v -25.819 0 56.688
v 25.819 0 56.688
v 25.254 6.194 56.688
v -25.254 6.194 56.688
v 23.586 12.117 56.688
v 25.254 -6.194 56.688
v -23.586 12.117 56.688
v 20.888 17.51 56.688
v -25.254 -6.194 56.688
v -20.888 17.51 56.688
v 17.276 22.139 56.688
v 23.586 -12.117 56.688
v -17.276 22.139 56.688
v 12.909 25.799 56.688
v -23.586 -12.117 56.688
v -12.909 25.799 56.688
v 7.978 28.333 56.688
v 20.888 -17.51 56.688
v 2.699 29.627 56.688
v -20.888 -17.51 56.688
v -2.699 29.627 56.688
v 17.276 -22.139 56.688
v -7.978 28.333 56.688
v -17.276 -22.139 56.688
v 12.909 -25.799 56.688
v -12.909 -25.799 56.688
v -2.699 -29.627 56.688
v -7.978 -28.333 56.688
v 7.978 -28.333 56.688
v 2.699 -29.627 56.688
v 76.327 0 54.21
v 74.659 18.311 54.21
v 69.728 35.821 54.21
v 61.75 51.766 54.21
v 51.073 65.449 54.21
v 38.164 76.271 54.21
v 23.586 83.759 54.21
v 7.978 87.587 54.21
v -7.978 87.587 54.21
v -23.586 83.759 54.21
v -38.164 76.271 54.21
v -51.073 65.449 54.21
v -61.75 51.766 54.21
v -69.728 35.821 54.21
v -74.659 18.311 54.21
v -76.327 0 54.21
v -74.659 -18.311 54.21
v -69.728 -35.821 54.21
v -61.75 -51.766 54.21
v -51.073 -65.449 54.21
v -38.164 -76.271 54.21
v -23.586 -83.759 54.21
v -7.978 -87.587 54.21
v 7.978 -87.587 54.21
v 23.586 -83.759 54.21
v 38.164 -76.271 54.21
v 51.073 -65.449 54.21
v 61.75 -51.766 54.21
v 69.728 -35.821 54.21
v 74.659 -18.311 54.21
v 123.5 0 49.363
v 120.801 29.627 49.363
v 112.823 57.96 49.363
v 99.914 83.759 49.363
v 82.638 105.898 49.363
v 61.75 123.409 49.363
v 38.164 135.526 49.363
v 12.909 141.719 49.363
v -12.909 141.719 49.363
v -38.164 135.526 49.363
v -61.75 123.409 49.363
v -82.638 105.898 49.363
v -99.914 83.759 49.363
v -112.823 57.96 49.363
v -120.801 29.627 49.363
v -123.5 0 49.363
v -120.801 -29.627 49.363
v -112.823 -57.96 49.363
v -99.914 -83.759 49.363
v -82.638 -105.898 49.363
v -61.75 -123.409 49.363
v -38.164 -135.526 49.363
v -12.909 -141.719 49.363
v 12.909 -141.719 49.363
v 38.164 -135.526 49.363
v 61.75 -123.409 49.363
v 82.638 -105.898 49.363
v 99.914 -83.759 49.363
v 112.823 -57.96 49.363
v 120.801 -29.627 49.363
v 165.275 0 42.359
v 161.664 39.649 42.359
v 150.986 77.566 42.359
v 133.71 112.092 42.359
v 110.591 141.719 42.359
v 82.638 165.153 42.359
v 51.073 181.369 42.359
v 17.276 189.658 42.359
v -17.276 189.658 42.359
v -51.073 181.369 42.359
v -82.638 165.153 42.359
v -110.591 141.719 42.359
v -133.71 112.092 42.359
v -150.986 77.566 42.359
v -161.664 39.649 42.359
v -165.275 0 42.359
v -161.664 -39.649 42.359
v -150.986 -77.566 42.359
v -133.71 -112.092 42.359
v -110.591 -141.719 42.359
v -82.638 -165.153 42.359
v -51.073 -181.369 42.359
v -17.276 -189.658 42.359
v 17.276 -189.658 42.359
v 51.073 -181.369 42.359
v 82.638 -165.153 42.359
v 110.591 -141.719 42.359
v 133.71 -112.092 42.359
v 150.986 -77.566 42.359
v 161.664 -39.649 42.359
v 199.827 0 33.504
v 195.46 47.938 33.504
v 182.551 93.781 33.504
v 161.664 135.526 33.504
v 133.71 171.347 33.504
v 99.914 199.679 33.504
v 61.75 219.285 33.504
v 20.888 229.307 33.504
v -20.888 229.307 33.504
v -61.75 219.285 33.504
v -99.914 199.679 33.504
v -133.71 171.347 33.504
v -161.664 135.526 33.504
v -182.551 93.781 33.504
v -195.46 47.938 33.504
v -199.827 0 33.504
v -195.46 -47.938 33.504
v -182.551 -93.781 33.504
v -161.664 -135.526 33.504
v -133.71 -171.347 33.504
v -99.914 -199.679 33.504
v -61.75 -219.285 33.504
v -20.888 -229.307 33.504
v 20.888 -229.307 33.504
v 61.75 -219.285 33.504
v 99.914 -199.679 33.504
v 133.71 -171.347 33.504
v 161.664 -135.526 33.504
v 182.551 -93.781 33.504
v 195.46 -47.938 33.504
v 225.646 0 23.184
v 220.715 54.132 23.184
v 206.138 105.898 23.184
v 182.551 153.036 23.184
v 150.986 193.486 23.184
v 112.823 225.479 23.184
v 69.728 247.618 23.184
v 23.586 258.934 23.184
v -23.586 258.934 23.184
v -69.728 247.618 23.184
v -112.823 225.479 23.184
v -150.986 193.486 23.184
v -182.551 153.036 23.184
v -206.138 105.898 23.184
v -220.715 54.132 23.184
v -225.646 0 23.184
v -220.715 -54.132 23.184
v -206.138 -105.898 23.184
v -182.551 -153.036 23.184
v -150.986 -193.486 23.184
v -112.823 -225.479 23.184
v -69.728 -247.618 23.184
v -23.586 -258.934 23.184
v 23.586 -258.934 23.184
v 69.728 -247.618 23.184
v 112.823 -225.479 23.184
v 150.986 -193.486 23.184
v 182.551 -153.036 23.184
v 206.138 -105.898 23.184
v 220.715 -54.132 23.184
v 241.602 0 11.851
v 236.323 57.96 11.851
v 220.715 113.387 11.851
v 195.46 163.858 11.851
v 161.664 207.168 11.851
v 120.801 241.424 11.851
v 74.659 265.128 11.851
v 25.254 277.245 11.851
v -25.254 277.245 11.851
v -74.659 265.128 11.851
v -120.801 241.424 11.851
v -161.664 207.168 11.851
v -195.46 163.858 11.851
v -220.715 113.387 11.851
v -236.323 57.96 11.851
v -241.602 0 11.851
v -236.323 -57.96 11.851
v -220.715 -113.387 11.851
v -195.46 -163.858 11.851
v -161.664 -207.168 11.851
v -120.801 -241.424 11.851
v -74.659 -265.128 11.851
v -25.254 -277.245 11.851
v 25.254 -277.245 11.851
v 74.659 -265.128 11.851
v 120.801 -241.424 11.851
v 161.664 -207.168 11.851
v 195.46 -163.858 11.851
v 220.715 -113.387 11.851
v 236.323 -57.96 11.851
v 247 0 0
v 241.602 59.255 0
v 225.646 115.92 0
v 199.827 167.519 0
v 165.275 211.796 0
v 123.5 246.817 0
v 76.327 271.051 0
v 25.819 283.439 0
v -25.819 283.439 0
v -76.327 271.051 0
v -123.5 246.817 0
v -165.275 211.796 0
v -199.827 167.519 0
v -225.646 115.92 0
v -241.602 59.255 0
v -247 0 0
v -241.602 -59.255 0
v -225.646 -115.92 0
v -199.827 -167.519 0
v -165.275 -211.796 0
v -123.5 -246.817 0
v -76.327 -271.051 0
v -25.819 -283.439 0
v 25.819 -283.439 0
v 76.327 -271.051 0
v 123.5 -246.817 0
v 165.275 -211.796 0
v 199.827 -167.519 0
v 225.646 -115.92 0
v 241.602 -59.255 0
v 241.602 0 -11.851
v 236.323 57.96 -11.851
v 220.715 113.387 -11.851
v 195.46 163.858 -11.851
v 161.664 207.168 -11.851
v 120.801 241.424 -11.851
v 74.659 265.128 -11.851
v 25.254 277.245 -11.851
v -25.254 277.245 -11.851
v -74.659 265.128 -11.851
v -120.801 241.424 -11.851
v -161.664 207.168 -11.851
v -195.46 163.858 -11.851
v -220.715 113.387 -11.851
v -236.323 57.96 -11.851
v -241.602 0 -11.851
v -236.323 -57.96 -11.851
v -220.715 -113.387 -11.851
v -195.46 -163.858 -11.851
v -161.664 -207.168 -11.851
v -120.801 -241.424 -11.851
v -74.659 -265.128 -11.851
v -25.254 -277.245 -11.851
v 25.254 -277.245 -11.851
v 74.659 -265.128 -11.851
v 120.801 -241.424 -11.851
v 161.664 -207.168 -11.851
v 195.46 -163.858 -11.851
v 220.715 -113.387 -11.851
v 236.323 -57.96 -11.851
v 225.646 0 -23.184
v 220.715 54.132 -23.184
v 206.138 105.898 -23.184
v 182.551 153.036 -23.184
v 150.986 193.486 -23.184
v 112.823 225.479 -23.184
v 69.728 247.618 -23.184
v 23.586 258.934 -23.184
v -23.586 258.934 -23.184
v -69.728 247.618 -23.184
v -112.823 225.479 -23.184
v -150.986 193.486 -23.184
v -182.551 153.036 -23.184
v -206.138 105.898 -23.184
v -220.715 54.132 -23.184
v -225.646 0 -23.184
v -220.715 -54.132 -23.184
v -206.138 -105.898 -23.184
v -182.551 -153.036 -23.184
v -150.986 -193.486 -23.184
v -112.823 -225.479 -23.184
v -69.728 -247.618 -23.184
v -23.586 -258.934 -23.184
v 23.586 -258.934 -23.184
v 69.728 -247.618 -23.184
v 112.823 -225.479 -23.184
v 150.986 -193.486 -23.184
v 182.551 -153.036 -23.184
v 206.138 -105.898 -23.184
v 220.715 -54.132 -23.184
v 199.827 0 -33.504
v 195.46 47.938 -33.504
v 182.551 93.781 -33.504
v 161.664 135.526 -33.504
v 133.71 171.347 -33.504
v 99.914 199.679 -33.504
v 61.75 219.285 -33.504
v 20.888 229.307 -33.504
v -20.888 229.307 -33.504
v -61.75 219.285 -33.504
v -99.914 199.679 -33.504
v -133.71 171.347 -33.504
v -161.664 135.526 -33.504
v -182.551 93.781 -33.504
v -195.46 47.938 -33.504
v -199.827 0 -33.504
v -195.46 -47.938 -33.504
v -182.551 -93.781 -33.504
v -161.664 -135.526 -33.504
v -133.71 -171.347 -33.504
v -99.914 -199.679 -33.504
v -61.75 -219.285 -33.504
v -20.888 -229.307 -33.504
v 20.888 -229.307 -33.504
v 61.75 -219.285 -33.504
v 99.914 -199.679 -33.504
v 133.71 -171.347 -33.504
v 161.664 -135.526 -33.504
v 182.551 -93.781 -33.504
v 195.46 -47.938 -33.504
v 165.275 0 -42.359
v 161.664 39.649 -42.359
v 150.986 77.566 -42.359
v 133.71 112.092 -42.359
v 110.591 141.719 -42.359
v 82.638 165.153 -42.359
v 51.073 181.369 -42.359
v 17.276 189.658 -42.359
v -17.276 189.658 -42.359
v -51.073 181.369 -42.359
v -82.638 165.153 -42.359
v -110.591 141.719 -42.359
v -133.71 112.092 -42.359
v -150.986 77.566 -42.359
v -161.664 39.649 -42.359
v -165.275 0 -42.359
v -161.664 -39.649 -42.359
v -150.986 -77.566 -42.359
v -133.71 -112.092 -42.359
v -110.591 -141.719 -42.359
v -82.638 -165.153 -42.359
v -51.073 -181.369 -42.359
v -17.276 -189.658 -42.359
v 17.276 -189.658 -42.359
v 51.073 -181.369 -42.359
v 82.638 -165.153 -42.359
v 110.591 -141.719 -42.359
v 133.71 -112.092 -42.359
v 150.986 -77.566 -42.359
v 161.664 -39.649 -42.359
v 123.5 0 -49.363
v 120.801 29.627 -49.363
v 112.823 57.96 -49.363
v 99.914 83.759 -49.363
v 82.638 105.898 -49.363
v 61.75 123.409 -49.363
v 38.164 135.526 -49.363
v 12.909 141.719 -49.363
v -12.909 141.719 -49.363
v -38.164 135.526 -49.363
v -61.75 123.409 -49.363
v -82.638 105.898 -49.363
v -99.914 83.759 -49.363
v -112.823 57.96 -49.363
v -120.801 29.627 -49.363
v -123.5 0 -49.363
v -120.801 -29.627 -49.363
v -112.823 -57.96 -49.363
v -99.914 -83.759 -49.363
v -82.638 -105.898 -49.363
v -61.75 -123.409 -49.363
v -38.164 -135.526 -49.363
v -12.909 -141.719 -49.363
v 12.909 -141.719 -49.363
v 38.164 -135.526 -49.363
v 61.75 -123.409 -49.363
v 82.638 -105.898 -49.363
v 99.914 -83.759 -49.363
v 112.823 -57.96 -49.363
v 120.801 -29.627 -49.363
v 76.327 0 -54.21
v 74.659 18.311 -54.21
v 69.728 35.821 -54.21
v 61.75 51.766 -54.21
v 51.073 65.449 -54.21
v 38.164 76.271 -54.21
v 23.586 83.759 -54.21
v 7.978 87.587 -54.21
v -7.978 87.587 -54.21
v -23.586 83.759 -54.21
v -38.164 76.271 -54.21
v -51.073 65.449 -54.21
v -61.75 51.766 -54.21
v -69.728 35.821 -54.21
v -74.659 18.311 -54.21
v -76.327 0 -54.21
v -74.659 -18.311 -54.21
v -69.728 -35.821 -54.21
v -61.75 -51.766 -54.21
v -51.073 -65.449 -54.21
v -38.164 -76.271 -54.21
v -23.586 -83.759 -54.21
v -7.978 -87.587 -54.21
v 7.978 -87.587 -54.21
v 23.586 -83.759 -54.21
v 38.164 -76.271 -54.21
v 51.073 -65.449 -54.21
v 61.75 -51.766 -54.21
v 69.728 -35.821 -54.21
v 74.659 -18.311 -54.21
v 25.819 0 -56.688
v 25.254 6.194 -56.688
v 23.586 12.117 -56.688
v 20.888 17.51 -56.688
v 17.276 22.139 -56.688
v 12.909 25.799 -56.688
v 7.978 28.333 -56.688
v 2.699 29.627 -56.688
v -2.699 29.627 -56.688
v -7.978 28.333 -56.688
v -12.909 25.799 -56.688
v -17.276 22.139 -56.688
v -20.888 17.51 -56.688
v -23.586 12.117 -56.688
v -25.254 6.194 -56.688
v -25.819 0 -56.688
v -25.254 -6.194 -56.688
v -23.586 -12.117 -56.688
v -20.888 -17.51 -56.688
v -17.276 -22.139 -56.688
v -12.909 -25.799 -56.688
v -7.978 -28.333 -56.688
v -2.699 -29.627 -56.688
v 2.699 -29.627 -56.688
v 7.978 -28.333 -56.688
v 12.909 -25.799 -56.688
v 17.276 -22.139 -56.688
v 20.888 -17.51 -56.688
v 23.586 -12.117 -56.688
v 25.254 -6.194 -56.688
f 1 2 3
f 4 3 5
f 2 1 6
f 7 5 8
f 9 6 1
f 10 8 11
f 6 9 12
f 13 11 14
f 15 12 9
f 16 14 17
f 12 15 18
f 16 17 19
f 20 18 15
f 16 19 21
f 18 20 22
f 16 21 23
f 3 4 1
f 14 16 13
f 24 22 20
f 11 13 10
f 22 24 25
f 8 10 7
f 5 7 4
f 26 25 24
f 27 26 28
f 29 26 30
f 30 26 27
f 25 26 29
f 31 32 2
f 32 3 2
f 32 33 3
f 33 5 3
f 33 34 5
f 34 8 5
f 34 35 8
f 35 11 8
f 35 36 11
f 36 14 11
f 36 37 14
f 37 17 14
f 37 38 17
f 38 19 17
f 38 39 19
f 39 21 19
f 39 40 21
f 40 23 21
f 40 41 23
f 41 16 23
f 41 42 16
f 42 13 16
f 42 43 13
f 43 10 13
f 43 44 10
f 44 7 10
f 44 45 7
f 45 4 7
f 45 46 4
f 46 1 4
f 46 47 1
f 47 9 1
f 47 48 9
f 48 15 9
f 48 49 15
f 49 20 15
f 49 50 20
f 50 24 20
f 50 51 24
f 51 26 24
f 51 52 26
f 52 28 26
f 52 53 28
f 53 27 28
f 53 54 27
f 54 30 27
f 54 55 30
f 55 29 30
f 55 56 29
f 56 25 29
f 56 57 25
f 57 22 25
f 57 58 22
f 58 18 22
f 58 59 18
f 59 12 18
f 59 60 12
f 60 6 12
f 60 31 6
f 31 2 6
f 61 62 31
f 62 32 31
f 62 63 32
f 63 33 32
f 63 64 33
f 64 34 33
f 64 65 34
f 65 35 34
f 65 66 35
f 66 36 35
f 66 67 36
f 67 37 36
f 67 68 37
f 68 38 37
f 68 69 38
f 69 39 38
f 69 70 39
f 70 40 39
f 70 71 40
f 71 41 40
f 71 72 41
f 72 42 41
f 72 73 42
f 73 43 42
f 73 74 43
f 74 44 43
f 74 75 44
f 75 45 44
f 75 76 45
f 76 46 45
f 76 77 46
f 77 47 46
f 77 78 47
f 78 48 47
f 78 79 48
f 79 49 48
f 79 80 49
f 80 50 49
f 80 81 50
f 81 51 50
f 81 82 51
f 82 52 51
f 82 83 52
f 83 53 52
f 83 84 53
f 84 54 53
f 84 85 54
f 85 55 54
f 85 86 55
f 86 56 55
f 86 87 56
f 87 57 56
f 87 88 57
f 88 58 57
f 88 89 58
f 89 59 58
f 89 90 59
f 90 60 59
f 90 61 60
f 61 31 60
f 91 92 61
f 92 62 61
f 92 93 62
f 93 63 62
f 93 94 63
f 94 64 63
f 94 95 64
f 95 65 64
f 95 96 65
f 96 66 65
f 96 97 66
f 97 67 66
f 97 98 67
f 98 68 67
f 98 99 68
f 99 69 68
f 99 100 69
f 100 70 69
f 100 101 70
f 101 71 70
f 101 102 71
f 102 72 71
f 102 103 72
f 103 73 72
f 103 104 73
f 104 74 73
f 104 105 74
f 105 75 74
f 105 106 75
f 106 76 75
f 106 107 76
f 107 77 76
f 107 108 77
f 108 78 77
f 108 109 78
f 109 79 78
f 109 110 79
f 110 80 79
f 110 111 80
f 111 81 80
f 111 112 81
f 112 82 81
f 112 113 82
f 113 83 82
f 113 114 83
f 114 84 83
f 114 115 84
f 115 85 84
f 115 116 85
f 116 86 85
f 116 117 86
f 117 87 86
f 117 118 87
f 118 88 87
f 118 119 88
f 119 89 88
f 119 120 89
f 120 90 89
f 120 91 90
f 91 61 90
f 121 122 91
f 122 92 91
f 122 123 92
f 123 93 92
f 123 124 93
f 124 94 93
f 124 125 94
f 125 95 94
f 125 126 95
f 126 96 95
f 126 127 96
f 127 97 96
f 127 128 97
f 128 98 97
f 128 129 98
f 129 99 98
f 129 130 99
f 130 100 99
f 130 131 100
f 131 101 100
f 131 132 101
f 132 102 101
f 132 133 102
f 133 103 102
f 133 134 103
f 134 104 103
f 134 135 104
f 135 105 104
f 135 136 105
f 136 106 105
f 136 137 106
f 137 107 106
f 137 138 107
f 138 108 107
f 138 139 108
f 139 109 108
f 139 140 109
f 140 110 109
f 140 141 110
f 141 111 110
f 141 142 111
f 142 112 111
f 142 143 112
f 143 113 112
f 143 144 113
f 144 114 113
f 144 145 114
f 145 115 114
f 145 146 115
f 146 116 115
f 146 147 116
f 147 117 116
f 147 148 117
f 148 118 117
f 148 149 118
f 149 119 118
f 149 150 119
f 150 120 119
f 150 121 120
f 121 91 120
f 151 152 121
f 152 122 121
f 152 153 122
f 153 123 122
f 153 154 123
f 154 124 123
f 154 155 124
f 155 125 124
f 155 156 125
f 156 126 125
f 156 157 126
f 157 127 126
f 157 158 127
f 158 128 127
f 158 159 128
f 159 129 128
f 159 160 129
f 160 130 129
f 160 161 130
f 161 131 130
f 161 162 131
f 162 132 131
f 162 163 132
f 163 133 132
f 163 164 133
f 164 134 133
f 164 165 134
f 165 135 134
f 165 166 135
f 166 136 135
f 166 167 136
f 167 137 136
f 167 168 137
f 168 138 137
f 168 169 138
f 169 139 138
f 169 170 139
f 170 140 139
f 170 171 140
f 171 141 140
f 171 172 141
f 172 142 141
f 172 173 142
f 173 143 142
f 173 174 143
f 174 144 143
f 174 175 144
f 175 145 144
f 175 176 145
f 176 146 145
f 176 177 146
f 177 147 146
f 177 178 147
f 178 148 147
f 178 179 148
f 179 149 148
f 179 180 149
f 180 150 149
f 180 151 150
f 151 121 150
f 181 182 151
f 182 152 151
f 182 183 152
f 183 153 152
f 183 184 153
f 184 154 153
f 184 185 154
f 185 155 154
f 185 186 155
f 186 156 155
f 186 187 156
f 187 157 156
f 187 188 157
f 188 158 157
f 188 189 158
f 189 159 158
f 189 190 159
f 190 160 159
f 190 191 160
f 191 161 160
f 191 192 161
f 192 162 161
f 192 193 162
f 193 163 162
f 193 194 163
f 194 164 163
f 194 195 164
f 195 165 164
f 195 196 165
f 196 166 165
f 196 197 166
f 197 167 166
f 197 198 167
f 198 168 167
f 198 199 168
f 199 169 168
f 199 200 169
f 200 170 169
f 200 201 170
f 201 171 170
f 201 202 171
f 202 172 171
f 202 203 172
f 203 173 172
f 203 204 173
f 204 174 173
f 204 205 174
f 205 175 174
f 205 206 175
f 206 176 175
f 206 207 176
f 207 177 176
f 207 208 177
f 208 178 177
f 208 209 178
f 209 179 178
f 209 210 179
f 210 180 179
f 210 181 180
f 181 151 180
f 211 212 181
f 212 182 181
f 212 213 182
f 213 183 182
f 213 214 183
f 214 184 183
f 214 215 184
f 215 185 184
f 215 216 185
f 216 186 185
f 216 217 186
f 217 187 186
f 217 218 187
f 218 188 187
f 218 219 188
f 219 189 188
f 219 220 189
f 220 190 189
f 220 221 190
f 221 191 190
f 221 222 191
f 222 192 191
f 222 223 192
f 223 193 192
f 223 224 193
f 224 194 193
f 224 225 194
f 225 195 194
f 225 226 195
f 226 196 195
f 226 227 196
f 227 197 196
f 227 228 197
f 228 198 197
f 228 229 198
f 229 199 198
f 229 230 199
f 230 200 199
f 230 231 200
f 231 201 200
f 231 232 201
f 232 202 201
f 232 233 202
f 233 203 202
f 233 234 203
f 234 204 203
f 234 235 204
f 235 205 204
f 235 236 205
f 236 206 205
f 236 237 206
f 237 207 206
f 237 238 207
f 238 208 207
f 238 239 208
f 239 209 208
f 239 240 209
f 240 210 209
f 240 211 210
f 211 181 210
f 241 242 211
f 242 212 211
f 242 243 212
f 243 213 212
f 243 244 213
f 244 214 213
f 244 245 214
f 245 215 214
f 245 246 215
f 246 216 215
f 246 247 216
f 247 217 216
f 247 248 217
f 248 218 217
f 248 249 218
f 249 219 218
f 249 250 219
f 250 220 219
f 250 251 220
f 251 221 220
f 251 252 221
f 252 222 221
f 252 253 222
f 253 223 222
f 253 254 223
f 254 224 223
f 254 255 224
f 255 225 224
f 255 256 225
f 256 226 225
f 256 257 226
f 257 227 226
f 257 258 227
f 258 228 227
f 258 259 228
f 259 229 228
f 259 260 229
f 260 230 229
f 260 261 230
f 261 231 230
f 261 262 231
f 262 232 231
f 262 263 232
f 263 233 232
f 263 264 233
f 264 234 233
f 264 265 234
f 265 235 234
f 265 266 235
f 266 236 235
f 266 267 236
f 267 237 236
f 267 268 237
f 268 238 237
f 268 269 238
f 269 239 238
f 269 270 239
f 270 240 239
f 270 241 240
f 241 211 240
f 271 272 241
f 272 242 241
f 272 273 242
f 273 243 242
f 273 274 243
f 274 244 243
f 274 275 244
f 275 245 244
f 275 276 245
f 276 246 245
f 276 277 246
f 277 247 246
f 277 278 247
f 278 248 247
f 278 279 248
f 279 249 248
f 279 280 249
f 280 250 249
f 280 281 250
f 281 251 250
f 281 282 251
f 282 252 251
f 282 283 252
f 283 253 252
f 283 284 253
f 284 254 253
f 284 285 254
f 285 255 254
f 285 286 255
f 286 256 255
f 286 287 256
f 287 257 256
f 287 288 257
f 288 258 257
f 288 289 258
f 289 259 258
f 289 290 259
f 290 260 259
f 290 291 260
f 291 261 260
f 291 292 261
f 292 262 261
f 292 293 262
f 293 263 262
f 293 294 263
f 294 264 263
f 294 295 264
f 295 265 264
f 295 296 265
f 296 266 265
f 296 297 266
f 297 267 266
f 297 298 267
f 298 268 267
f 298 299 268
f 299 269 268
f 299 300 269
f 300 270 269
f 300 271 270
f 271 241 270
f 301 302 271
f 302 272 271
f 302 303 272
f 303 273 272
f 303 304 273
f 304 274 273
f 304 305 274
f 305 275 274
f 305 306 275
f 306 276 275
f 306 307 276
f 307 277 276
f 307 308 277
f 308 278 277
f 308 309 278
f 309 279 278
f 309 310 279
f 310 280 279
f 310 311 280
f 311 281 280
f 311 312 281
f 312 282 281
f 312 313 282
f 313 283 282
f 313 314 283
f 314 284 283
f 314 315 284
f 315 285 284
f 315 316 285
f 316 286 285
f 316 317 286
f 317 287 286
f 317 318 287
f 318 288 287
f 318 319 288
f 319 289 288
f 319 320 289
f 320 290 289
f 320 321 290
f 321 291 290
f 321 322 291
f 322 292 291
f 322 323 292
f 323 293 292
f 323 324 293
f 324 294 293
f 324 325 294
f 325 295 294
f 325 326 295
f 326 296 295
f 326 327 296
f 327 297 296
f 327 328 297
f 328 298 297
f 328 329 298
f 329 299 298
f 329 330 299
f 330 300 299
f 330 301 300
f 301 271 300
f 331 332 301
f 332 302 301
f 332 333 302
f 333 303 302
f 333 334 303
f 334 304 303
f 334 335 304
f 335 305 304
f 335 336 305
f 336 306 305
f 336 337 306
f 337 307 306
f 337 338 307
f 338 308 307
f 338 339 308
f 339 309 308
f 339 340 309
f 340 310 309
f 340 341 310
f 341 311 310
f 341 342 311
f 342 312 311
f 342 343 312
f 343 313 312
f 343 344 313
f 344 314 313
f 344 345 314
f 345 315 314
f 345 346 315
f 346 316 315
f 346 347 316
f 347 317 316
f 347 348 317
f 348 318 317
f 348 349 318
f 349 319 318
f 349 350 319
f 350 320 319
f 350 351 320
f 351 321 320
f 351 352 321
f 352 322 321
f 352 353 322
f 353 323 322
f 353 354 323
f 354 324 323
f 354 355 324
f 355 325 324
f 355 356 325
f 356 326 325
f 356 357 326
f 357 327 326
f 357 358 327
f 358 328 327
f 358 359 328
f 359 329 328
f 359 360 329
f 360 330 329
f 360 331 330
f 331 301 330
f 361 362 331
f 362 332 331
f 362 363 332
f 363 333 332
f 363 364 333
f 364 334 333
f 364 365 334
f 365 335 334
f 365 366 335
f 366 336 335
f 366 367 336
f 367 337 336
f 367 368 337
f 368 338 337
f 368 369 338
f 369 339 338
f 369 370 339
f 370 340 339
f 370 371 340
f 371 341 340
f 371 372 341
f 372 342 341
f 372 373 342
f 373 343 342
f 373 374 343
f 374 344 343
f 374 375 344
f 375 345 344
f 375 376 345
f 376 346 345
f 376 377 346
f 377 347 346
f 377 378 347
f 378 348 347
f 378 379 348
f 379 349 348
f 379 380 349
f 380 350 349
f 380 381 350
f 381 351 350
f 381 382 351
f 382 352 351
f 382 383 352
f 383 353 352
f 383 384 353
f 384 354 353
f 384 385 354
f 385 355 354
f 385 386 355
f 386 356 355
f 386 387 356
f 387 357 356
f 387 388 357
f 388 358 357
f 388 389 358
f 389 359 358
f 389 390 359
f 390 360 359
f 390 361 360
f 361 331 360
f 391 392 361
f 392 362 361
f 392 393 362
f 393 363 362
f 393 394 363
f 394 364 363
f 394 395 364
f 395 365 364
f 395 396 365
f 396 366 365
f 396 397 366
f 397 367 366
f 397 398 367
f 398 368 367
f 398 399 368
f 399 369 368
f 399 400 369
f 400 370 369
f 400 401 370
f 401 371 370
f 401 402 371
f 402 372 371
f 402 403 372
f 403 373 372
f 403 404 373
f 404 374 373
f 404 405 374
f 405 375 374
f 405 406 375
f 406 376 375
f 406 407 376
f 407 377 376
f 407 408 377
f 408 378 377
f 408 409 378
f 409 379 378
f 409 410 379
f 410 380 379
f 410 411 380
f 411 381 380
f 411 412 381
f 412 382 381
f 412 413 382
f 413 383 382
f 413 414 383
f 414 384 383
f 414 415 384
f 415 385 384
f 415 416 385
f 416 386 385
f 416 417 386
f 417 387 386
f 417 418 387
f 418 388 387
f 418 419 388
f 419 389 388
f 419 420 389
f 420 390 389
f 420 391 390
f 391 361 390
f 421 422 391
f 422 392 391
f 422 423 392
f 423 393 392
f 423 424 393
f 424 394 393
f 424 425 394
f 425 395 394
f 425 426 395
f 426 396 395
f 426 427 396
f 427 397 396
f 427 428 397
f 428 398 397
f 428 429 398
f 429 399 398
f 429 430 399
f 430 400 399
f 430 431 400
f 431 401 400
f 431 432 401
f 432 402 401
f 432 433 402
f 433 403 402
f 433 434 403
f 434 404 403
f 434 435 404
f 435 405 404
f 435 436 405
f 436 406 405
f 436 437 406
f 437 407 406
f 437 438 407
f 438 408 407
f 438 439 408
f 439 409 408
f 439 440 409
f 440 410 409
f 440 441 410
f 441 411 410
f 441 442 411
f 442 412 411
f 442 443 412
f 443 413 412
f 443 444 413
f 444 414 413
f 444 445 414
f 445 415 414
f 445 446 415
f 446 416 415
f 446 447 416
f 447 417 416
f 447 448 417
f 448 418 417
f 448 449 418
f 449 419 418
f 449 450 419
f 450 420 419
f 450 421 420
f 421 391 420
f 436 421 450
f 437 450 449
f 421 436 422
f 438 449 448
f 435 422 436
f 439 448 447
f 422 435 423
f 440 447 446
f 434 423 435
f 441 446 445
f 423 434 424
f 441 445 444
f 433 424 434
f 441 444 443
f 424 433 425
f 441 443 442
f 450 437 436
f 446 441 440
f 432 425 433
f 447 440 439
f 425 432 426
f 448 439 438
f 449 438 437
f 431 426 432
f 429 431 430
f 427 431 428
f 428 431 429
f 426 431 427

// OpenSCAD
// Generated by SolidPython 1.0.1 on 2020-07-29 00:46:51


scale(v = [13, 15, 3]) {
	sphere(r = 19);
}
/***********************************************
*********      SolidPython code:      **********
************************************************
 
# import packages: SolidPython
from solid import *
from solid.utils import *
from itertools import chain, combinations, permutations


class Resize:

    def __init__(self, scad_file):
        self.scad_file = scad_file
        #self.scad_file = import_scad(scad_file)
        # cone/cylinder param:
        self.r1 = 0
        self.r2 = 0
        self.h = 0
        # rectangular prism param:
        self.w = 0
        self.l = 0
        # ellipse param:
        self.r = 0

    # import OpenScad code (file name corresponds to shape)


    # classify shape + parameters
    def assign(self, param1, param2, param3):
        if self.scad_file == 'cone.scad':
            self.r1 = param1
            self.r2 = param2
            self.h = param3
        elif self.scad_file == 'cylinder.scad':
            self.r1 = param1
            self.r2 = param2
            self.h = param3
        elif self.scad_file == 'rectangularPrism.scad':
            self.h = param1
            self.l = param2
            self.w = param3
        else:
            self.r = param1
            self.h = param2

    # resize parameters
    def iterate(self):
        x = range(3, 20, 2)
        i = 1
        if self.scad_file == 'cone.scad':
            tempList = list(permutations(x, 2))
            for temp in tempList:
                param1 = temp[0]
                param2 = temp[1]
                filepath = 'produced_scad_files/' + 'cone' + str(param1) + '_' + str(param2) + '_' + '.scad'
                scad_render_to_file(cylinder(h=param1, r1=param2, r2=0), filepath)

        elif self.scad_file == 'cylinder.scad':
            tempList = list(permutations(x, 3))
            for temp in tempList:
                param1 = temp[0]
                param2 = temp[1]
                filepath = 'produced_scad_files/' + 'cylinder' + str(param1) + '_' + str(param2) + '_' + '.scad'
                scad_render_to_file(cylinder(h=param1, r1=param2, r2=param2), filepath)

        elif self.scad_file == 'rectangularPrism.scad':
            tempList = list(permutations(x, 3))
            for temp in tempList:
                param1 = temp[0]
                param2 = temp[1]
                param3 = temp[2]
                filepath = 'produced_scad_files/' + 'rectangularPrism' + str(param1) + '_' + str(param2) + '_' + str(
                    param3) + '.scad'
                scad_render_to_file(cube(size=(param1, param2, param3)), filepath)

        elif self.scad_file == 'ellipse.scad':
            tempList = list(permutations(x, 4))
            for temp in tempList:
                param1 = temp[0]
                param2 = temp[1]
                param3 = temp[2]
                param4 = temp[3]
                filepath = 'produced_scad_files/' + 'ellipse' + str(param1) + '_' + str(param2) + '_' + str(param3) + '_' + str(param4) + '.scad'
                scad_render_to_file(scale([param1, param2, param3])(sphere(r=param4)), filepath)

    def render_to_scadfile(self):
        scad_render_to_file(scad, 'example.scad') 
 
************************************************/
